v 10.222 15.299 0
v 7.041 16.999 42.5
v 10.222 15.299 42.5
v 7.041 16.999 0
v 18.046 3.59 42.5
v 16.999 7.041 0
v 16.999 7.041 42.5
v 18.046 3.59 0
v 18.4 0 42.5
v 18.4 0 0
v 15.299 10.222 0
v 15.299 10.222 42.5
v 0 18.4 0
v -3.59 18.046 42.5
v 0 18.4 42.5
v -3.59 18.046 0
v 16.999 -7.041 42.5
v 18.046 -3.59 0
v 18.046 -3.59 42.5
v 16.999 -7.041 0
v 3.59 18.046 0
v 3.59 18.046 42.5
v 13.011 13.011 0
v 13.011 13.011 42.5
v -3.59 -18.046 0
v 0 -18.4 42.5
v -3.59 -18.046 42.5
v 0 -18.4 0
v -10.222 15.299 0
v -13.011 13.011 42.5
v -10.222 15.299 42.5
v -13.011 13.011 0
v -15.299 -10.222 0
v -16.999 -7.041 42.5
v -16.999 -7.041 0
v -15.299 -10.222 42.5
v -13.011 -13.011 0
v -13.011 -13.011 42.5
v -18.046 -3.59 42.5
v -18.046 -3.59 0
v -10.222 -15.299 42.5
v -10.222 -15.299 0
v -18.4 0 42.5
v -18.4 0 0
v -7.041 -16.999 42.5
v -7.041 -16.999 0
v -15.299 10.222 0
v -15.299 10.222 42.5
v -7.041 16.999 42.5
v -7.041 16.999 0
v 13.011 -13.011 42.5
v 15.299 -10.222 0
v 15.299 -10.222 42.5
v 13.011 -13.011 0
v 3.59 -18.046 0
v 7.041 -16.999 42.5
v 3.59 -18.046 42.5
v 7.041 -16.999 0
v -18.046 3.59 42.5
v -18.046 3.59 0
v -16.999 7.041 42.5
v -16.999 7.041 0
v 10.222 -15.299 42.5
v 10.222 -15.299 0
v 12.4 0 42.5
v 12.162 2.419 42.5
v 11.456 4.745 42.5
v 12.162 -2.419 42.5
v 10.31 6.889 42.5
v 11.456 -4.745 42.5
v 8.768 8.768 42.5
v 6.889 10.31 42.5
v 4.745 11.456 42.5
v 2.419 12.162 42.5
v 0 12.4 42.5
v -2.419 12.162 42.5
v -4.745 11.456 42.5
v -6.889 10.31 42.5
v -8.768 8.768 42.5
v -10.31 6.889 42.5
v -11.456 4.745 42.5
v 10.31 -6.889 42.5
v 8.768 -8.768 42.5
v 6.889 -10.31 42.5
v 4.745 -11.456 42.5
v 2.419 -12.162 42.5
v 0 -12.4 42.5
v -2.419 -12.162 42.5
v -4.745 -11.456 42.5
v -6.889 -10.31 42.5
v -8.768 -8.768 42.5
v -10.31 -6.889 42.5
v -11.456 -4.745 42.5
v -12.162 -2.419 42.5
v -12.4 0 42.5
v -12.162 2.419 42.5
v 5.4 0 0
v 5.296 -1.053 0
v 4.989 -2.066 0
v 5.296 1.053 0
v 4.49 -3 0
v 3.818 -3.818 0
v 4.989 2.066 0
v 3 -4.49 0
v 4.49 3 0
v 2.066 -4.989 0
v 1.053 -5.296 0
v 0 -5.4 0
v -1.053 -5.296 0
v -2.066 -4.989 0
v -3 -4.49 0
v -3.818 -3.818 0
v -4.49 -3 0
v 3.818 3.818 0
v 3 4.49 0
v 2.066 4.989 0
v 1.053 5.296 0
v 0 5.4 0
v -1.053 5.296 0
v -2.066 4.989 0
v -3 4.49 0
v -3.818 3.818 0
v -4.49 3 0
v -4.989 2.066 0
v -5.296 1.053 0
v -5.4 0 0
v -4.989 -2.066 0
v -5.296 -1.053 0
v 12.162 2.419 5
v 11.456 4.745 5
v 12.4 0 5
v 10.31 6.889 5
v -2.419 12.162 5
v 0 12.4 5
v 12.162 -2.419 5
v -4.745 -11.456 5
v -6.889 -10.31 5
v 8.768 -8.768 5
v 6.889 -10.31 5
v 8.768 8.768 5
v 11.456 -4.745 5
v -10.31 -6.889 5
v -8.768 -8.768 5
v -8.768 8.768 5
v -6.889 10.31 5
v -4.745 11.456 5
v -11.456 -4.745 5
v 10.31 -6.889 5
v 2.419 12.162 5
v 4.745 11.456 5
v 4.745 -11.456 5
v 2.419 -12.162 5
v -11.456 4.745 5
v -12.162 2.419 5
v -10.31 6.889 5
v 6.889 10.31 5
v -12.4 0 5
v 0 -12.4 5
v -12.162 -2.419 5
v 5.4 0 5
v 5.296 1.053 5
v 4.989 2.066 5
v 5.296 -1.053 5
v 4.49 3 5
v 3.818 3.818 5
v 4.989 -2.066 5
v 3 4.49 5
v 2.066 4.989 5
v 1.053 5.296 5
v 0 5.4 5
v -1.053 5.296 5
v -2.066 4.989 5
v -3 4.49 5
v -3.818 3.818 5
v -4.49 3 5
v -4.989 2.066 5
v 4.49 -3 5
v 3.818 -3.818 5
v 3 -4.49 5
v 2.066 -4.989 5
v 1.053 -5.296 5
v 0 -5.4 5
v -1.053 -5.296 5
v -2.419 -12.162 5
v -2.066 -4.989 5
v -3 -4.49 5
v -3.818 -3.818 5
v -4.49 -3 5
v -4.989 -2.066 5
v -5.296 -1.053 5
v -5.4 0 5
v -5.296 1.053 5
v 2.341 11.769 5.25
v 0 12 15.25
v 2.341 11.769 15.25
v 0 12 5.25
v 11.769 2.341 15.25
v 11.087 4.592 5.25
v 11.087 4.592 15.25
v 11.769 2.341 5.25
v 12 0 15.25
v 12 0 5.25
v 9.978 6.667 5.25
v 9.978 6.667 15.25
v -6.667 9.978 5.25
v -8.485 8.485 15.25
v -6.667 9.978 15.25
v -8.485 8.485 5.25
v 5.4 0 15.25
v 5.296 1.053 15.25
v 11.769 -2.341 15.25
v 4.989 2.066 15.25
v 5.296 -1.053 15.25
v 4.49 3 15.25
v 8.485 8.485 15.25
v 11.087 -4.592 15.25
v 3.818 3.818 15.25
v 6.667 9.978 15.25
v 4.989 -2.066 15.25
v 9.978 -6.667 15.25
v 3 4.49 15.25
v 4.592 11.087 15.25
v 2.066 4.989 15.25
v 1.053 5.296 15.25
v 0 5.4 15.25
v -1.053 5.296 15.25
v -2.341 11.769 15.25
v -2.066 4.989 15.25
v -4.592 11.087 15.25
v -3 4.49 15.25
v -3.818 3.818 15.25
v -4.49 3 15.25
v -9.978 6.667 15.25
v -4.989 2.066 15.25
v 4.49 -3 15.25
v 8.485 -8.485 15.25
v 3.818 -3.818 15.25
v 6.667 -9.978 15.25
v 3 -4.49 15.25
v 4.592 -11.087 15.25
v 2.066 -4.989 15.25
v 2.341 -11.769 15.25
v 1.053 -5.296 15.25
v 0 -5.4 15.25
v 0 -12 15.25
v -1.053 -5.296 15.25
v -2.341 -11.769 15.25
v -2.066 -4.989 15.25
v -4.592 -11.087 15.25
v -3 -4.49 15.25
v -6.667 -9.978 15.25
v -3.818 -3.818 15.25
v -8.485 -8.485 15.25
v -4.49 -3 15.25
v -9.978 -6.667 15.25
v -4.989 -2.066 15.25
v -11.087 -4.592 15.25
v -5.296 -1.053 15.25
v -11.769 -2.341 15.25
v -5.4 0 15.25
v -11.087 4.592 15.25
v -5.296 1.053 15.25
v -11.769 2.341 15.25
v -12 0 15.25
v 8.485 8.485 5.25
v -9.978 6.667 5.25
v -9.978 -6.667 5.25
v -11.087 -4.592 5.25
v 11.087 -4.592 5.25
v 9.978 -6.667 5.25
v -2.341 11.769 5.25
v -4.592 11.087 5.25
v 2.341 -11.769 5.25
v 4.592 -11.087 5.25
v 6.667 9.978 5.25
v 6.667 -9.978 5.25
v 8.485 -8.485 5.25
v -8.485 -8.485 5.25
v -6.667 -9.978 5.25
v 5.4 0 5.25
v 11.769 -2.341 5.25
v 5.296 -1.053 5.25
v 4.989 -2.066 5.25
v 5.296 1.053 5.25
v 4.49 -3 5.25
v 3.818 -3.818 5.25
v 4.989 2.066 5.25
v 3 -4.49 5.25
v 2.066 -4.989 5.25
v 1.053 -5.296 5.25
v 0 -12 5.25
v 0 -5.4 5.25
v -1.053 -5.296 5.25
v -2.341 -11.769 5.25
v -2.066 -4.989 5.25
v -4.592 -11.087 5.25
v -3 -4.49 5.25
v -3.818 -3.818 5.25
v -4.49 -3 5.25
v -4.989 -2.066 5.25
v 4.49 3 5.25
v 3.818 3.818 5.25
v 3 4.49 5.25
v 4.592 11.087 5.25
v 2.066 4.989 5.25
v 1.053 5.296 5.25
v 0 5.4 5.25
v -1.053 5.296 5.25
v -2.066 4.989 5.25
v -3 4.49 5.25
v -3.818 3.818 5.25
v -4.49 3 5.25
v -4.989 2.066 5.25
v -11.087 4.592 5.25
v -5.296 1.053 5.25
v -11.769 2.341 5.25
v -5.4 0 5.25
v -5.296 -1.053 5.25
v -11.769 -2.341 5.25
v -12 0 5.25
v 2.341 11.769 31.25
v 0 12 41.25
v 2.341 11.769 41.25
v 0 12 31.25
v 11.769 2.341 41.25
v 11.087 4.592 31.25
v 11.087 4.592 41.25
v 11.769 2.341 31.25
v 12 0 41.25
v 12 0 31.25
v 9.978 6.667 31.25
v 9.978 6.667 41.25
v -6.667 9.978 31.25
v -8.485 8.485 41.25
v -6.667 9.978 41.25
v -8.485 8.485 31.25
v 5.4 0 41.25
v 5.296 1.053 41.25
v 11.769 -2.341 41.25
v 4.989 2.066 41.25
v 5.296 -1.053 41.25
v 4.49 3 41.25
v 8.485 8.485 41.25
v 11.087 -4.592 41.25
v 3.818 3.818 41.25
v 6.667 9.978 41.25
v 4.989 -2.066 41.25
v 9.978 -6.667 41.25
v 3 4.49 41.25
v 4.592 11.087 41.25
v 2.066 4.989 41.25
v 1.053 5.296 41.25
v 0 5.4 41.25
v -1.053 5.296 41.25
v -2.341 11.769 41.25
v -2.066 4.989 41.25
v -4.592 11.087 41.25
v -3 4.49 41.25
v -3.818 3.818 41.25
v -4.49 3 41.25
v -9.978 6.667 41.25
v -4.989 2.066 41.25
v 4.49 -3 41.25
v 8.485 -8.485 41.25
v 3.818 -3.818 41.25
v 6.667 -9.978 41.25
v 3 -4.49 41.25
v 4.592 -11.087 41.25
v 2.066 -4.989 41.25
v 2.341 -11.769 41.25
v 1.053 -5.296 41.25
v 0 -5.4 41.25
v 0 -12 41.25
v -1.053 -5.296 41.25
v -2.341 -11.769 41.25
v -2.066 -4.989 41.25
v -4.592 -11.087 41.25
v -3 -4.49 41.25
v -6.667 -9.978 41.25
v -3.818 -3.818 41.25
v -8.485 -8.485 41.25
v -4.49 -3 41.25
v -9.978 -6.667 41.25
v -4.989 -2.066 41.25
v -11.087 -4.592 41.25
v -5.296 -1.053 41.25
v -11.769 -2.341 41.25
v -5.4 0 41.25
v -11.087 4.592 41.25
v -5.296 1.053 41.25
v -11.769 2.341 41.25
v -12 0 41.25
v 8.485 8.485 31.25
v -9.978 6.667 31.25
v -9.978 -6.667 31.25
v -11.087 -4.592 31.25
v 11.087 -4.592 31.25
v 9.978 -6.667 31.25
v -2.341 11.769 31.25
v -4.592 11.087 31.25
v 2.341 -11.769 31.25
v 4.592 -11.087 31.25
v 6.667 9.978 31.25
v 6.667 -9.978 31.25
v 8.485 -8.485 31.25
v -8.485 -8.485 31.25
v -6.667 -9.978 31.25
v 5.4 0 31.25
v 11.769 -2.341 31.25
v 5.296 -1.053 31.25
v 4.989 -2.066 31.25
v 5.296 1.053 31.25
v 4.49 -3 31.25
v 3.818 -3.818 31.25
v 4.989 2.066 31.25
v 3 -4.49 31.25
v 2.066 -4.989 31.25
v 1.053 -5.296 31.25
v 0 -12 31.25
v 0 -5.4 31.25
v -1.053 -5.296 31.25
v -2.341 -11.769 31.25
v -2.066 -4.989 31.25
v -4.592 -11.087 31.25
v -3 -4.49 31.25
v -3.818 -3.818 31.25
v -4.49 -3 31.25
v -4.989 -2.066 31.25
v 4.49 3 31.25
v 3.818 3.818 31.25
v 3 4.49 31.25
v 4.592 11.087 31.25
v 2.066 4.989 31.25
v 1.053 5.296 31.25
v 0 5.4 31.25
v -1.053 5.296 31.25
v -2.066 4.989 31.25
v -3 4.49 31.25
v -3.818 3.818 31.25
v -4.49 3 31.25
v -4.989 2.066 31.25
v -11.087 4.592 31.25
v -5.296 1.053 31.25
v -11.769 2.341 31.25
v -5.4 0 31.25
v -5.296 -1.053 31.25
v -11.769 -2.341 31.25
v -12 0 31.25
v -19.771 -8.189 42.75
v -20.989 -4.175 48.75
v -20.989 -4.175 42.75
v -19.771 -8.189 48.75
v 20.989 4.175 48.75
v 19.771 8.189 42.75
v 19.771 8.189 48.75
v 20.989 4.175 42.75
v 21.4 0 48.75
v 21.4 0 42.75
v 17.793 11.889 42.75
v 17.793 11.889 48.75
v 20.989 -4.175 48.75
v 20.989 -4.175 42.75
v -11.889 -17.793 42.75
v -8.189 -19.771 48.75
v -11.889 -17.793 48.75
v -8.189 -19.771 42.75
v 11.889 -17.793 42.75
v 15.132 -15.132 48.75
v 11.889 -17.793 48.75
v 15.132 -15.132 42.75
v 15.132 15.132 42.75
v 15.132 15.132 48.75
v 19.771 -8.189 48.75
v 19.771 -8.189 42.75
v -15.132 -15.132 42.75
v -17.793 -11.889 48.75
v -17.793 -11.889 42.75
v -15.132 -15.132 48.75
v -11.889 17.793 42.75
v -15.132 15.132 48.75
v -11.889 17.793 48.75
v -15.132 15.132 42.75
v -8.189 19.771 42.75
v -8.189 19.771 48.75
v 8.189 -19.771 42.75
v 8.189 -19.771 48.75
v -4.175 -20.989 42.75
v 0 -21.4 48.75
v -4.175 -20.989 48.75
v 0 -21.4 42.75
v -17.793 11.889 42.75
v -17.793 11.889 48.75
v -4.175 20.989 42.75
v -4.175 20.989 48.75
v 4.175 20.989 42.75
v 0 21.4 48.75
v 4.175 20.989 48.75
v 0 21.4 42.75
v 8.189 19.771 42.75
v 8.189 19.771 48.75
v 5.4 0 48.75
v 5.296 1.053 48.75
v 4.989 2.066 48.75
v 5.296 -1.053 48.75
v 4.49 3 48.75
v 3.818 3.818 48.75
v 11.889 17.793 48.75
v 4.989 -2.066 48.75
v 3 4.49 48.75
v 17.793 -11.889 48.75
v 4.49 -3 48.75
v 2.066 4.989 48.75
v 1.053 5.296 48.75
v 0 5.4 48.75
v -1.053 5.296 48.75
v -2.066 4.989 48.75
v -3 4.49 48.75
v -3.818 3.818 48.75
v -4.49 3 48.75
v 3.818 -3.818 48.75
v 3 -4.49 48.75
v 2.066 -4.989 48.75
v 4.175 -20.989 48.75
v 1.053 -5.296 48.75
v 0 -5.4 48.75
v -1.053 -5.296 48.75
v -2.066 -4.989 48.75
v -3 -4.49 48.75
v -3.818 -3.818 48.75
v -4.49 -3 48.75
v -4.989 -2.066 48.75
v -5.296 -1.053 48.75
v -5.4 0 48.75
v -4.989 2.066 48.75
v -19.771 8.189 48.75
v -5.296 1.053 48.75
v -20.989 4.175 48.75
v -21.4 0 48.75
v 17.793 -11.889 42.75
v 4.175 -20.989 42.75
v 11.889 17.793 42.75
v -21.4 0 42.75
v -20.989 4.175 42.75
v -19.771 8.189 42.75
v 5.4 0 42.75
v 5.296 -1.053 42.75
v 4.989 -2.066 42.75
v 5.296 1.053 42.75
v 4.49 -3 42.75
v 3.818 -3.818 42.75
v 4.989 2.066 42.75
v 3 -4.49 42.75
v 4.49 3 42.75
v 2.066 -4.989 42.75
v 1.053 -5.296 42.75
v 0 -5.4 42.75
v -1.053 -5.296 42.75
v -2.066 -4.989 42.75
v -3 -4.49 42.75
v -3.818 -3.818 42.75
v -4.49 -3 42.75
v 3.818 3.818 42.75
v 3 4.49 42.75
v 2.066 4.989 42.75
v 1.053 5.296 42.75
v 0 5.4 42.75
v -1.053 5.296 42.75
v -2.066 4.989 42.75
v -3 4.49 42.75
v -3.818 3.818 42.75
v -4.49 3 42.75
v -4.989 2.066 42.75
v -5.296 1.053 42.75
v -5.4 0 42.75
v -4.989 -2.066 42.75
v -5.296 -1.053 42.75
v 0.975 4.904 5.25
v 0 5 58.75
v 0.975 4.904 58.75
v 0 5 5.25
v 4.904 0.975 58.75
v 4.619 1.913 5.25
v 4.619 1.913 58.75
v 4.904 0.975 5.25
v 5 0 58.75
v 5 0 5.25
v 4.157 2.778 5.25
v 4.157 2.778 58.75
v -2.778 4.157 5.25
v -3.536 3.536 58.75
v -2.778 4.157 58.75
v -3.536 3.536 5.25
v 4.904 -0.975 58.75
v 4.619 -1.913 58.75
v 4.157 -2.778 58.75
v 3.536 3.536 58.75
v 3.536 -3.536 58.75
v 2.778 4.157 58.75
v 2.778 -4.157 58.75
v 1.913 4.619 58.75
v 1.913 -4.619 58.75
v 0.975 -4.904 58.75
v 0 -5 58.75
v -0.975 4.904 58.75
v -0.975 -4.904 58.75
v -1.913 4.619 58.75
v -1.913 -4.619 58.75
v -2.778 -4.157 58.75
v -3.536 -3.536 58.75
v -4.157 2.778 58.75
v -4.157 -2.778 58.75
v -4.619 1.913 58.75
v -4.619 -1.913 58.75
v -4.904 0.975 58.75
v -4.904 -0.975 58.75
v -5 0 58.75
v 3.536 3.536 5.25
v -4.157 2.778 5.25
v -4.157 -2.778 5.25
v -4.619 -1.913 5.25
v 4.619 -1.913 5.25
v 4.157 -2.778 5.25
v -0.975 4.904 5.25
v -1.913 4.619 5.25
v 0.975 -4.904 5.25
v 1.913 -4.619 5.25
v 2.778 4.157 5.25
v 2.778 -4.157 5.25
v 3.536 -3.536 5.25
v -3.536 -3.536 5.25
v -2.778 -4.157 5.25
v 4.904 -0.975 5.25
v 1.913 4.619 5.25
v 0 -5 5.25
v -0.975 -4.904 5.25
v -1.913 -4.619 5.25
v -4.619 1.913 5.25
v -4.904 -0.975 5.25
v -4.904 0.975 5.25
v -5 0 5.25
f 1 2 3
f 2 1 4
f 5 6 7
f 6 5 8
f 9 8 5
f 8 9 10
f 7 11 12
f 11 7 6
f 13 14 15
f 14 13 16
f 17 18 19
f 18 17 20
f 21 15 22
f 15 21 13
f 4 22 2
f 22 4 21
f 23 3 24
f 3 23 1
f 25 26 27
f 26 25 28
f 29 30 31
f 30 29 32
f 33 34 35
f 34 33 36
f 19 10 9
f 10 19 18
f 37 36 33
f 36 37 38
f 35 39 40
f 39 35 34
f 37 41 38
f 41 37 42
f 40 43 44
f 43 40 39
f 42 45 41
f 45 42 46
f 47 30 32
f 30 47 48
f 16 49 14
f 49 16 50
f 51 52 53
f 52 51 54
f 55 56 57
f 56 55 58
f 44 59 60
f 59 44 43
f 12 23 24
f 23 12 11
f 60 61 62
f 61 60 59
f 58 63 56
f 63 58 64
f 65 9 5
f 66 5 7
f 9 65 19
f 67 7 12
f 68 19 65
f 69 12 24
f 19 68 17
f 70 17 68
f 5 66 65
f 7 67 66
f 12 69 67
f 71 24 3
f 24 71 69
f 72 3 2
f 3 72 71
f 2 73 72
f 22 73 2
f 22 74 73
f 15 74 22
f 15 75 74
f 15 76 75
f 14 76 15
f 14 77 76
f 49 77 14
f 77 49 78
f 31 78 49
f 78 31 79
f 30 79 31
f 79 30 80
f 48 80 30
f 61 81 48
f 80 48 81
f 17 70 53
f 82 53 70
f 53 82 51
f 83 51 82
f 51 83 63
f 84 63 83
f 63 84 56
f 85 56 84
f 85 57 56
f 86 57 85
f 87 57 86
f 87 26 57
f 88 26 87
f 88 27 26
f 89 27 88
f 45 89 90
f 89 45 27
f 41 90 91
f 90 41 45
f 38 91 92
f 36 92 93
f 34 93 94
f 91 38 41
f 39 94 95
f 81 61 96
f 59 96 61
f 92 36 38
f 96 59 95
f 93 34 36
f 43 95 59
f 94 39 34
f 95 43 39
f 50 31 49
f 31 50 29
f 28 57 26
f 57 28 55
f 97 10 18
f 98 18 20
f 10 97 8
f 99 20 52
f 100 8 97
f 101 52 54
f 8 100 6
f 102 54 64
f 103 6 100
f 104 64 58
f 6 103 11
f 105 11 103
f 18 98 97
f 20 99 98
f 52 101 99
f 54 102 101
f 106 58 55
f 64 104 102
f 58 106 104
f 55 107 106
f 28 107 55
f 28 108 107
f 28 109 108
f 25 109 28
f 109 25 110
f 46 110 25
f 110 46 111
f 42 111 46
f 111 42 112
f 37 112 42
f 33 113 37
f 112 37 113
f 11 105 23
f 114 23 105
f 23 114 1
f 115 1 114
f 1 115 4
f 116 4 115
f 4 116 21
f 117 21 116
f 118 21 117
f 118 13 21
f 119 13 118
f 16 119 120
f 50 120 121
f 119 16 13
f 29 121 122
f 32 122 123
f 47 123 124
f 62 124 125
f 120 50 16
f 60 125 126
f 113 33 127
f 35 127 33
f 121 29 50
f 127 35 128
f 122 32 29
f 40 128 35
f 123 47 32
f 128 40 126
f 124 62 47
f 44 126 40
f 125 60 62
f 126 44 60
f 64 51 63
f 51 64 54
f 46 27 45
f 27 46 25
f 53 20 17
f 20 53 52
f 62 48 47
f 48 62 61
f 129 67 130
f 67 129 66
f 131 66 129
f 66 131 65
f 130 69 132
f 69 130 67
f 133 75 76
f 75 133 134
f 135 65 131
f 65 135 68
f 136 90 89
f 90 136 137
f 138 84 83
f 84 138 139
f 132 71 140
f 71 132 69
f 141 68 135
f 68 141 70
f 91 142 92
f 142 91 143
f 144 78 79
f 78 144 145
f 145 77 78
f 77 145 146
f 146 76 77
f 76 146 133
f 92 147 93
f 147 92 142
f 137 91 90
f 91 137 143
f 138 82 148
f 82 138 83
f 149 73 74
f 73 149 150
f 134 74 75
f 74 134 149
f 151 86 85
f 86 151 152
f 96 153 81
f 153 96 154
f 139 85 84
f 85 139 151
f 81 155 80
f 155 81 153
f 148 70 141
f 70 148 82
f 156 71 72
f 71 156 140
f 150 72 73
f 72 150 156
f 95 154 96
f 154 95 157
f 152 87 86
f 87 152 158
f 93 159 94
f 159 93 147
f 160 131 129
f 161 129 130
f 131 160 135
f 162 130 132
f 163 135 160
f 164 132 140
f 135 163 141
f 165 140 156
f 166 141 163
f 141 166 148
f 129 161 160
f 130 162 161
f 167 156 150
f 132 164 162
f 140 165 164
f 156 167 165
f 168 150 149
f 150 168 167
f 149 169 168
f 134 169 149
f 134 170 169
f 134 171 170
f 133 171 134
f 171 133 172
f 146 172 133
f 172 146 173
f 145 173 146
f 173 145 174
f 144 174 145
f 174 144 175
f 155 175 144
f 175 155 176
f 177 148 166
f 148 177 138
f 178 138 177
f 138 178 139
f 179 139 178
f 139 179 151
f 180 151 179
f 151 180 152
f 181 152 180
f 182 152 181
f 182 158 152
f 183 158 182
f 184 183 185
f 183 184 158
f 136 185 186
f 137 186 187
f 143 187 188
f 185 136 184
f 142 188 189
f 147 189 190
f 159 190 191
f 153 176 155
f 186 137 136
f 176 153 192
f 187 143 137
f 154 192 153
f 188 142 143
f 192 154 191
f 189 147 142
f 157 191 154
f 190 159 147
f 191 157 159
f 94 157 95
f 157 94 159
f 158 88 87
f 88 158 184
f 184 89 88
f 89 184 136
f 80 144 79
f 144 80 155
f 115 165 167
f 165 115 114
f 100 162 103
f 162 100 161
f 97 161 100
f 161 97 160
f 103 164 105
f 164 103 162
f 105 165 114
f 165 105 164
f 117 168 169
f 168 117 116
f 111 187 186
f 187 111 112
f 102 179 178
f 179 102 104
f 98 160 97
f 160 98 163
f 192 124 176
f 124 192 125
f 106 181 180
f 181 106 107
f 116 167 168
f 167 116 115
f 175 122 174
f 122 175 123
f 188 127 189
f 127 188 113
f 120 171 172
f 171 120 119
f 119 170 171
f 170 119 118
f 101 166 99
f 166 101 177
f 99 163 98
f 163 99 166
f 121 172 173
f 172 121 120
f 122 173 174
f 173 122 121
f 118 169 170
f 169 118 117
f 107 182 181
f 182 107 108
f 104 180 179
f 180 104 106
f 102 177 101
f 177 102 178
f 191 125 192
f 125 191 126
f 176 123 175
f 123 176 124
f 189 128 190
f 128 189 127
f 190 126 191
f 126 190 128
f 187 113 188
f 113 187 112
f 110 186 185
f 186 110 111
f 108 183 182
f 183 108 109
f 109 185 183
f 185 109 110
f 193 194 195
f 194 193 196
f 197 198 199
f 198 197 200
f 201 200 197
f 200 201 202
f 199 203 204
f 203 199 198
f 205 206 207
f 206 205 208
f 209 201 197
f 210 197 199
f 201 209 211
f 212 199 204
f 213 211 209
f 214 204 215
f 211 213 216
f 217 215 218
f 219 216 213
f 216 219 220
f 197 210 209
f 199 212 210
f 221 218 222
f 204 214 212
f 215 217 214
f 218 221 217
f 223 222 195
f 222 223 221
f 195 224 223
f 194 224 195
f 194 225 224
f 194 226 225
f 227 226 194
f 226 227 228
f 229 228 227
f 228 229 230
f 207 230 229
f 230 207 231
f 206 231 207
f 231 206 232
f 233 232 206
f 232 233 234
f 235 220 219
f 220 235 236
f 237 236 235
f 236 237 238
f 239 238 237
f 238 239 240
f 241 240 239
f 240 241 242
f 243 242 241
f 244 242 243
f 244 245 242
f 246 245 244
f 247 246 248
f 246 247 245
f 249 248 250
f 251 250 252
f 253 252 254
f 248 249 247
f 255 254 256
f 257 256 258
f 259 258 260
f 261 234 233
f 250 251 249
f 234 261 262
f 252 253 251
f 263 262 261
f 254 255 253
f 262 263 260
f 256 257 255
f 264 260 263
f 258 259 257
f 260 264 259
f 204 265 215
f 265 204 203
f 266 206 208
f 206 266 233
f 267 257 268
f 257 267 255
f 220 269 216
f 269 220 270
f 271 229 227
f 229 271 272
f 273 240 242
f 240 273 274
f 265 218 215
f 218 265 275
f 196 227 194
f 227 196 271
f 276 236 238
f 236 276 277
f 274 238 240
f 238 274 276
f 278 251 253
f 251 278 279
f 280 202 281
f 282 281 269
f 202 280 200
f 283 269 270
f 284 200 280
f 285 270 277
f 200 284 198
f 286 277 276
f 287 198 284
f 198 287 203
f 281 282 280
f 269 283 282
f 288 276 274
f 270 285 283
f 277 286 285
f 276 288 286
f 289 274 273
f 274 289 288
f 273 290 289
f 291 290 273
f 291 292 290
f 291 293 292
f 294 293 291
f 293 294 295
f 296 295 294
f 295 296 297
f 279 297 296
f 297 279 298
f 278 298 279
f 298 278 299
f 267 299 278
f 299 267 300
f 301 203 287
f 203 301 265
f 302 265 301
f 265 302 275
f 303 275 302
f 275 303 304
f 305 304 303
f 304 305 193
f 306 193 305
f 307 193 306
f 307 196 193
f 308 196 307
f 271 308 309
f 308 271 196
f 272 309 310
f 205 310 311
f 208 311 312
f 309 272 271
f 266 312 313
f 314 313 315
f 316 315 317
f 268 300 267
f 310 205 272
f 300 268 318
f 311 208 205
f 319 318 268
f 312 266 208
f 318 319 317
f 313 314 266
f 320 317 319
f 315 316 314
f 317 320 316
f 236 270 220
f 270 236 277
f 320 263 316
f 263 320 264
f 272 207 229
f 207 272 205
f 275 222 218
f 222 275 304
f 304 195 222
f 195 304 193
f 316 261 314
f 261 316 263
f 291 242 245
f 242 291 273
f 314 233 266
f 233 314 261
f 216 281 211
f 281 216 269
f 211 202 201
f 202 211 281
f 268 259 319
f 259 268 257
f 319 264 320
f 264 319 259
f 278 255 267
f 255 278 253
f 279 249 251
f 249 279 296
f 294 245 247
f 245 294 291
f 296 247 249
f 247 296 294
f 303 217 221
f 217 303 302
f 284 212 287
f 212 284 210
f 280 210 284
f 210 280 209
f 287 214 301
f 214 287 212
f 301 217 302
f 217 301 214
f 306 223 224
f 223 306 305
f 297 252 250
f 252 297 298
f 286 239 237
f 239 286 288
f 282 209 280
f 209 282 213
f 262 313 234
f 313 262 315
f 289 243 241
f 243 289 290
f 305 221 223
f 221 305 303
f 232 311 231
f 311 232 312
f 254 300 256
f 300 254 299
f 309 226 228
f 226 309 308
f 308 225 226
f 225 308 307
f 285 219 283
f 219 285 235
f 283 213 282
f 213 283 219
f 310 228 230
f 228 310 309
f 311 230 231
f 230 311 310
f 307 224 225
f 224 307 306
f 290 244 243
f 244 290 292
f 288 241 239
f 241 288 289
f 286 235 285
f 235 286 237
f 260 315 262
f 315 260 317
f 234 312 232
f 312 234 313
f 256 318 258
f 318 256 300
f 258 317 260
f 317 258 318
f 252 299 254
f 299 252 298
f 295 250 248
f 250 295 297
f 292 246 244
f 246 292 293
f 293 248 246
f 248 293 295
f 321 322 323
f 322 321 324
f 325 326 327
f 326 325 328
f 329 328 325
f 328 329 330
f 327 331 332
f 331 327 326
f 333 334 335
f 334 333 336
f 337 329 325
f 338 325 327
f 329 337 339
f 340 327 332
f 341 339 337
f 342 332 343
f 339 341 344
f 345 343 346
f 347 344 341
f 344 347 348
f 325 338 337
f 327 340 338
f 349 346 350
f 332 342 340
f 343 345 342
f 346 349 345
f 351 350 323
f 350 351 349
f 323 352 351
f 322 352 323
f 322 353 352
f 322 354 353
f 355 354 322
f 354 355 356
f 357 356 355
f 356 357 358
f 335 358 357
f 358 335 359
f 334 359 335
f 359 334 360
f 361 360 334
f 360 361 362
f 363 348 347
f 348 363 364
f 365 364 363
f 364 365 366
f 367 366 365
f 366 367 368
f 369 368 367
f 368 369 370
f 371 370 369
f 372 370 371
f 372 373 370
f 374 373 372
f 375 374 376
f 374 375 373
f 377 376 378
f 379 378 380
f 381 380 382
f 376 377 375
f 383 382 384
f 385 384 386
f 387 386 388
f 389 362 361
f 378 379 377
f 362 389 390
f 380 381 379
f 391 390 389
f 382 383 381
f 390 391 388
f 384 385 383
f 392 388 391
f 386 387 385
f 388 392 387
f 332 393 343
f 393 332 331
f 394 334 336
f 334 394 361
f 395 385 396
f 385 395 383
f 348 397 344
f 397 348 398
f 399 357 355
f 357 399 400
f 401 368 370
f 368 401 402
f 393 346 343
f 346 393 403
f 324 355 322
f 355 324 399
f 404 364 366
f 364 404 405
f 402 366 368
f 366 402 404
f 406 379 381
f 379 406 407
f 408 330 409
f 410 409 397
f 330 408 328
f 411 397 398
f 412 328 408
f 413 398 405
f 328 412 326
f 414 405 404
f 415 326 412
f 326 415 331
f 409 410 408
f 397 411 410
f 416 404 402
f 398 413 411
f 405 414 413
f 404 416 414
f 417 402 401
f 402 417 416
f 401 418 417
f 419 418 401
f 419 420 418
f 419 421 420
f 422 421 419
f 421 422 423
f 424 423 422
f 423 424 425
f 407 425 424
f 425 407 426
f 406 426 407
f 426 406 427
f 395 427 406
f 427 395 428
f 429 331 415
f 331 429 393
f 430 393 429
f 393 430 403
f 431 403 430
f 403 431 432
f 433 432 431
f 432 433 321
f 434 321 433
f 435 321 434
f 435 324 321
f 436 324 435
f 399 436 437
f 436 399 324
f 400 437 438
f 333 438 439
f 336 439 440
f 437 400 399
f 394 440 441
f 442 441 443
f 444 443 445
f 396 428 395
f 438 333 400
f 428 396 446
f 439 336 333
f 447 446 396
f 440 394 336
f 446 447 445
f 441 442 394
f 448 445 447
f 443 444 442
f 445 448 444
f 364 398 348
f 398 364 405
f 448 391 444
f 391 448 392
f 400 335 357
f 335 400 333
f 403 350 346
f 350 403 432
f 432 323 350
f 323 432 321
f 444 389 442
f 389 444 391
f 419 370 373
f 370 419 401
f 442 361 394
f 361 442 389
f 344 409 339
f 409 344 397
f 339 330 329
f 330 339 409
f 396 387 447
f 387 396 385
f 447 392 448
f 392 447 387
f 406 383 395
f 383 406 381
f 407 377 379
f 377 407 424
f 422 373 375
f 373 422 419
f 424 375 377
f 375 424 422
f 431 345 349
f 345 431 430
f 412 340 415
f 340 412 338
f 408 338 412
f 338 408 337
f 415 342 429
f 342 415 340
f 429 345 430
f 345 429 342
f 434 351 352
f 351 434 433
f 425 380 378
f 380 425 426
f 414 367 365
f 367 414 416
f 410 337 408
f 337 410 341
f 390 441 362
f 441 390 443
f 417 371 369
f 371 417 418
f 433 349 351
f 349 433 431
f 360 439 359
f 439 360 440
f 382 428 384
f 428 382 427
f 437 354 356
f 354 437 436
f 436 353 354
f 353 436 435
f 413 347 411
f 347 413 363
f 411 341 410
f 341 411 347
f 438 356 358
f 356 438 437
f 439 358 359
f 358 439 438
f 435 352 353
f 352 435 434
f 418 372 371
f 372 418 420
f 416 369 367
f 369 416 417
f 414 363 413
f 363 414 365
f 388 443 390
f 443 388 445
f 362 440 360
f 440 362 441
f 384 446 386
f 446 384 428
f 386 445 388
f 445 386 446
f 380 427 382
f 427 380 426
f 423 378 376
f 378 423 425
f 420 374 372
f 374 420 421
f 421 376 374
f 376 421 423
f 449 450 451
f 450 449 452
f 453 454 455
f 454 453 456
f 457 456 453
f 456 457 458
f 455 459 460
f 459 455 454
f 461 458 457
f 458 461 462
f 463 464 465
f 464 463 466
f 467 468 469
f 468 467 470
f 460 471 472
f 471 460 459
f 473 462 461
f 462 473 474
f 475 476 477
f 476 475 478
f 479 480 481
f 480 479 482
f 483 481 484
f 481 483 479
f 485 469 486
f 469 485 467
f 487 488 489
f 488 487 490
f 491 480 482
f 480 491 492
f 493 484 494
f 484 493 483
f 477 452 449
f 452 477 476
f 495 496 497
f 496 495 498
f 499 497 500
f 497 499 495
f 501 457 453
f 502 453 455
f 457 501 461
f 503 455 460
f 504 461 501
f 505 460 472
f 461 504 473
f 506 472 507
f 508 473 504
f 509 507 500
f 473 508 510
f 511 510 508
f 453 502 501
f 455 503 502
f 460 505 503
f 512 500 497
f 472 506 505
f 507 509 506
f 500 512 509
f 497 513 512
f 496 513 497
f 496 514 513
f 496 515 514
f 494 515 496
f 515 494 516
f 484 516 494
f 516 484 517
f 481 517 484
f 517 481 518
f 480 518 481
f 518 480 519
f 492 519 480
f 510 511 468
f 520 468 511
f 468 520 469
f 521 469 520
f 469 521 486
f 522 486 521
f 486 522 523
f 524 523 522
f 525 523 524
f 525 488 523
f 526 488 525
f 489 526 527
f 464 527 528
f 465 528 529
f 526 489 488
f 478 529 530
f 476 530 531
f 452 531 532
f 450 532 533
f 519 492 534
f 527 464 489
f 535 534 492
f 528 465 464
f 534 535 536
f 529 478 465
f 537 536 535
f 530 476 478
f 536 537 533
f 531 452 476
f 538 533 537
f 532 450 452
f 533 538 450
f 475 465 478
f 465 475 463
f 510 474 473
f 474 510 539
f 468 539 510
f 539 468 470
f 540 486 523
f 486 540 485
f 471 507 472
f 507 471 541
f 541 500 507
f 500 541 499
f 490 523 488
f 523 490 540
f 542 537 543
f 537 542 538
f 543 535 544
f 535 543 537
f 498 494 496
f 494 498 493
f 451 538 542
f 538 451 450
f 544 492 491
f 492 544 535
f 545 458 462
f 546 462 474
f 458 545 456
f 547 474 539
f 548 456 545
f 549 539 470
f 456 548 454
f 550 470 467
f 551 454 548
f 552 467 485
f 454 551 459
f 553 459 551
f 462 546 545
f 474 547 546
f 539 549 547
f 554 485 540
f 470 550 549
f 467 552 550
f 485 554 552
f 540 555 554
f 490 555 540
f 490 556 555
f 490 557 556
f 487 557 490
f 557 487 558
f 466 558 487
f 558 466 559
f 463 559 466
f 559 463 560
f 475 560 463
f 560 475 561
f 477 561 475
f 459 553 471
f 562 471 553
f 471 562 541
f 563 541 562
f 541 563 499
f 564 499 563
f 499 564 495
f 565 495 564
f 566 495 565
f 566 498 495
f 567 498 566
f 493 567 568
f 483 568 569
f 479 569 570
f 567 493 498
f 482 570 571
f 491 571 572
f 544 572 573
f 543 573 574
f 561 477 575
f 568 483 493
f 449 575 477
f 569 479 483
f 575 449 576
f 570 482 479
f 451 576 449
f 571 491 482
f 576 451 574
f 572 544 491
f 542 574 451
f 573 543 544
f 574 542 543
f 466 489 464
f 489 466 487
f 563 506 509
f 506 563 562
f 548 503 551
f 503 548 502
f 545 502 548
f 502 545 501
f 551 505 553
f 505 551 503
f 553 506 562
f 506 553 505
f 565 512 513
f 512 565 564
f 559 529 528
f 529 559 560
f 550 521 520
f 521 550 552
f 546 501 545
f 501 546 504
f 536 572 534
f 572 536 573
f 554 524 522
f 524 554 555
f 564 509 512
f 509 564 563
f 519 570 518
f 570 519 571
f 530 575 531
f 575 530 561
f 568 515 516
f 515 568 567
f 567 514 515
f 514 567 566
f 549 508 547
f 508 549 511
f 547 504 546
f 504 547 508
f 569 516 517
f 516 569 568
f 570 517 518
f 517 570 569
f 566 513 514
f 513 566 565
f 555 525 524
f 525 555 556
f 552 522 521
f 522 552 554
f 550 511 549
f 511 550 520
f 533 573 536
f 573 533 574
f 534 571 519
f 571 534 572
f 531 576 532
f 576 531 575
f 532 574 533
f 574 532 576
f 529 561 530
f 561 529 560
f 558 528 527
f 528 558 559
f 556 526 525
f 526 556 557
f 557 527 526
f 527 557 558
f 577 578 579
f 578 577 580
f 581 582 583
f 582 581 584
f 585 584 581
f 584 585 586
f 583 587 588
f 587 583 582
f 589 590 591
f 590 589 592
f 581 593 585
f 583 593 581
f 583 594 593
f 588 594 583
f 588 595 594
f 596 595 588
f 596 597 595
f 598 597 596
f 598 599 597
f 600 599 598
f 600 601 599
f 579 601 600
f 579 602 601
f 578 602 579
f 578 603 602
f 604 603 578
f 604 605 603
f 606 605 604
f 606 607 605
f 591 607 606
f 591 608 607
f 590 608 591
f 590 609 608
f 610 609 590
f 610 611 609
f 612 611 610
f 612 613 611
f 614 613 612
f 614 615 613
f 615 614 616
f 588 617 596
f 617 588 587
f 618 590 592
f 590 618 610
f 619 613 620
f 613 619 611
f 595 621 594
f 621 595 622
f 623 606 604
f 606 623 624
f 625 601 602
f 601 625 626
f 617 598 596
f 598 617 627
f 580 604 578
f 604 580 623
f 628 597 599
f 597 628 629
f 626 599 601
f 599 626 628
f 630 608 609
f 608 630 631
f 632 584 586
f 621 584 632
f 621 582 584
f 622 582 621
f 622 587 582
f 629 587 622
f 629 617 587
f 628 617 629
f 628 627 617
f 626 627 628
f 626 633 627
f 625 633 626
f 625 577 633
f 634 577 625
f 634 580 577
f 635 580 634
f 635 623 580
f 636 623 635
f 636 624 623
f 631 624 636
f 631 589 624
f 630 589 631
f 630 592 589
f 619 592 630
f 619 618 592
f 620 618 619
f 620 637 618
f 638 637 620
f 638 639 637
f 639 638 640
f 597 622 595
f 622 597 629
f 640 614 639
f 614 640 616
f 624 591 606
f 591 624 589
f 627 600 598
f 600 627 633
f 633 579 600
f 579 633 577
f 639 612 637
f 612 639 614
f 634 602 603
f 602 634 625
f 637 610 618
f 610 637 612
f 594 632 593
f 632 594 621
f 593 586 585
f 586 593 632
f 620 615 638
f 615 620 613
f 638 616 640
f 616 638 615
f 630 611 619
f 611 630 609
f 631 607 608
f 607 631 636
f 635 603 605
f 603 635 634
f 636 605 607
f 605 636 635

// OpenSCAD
$fn = 32;

// ------------------------------------------------------------------------
// Shaft station: cup d36.8 x 42.5 mm, shaft d10
// Every part is its own module, assembly() places every instance.
// ------------------------------------------------------------------------

// --- part 1 ---
module housing_cup() {
  difference() {
    cylinder(h = 42.5, d = 36.8);
    translate([0, 0, 5]) cylinder(h = 38.5, d = 24.8);
    translate([0, 0, -1]) cylinder(h = 7, d = 10.8);
  }
}

// --- part 2 ---
module bearing_lower() {
  difference() {
      translate([0, 0, 0]) cylinder(h = 10, d = 24);
      translate([0, 0, -1]) cylinder(h = 12, d = 10.8);
    }
}

// --- part 3 ---
module bearing_upper() {
  difference() {
      translate([0, 0, 0]) cylinder(h = 10, d = 24);
      translate([0, 0, -1]) cylinder(h = 12, d = 10.8);
    }
}

// --- part 4 ---
module station_shaft() {
  translate([0, 0, -26.75]) cylinder(h = 53.5, d = 10);
}

// --- part 5 ---
module station_cover() {
  difference() {
    cylinder(h = 6, d = 42.8);
    translate([0, 0, -1]) cylinder(h = 8, d = 10.8);
  }
}

// --- assembly ---
module assembly() {
  color([0.80, 0.24, 0.20]) translate([0, 0, 0]) rotate([0, 0, 0]) housing_cup();
  color([0.20, 0.45, 0.75]) translate([0, 0, 5.25]) rotate([0, 0, 0]) bearing_lower();
  color([0.25, 0.62, 0.32]) translate([0, 0, 31.25]) rotate([0, 0, 0]) bearing_upper();
  color([0.92, 0.70, 0.18]) translate([0, 0, 32]) rotate([0, 0, 0]) station_shaft();
  color([0.58, 0.35, 0.70]) translate([0, 0, 42.75]) rotate([0, 0, 0]) station_cover();
}

assembly();
